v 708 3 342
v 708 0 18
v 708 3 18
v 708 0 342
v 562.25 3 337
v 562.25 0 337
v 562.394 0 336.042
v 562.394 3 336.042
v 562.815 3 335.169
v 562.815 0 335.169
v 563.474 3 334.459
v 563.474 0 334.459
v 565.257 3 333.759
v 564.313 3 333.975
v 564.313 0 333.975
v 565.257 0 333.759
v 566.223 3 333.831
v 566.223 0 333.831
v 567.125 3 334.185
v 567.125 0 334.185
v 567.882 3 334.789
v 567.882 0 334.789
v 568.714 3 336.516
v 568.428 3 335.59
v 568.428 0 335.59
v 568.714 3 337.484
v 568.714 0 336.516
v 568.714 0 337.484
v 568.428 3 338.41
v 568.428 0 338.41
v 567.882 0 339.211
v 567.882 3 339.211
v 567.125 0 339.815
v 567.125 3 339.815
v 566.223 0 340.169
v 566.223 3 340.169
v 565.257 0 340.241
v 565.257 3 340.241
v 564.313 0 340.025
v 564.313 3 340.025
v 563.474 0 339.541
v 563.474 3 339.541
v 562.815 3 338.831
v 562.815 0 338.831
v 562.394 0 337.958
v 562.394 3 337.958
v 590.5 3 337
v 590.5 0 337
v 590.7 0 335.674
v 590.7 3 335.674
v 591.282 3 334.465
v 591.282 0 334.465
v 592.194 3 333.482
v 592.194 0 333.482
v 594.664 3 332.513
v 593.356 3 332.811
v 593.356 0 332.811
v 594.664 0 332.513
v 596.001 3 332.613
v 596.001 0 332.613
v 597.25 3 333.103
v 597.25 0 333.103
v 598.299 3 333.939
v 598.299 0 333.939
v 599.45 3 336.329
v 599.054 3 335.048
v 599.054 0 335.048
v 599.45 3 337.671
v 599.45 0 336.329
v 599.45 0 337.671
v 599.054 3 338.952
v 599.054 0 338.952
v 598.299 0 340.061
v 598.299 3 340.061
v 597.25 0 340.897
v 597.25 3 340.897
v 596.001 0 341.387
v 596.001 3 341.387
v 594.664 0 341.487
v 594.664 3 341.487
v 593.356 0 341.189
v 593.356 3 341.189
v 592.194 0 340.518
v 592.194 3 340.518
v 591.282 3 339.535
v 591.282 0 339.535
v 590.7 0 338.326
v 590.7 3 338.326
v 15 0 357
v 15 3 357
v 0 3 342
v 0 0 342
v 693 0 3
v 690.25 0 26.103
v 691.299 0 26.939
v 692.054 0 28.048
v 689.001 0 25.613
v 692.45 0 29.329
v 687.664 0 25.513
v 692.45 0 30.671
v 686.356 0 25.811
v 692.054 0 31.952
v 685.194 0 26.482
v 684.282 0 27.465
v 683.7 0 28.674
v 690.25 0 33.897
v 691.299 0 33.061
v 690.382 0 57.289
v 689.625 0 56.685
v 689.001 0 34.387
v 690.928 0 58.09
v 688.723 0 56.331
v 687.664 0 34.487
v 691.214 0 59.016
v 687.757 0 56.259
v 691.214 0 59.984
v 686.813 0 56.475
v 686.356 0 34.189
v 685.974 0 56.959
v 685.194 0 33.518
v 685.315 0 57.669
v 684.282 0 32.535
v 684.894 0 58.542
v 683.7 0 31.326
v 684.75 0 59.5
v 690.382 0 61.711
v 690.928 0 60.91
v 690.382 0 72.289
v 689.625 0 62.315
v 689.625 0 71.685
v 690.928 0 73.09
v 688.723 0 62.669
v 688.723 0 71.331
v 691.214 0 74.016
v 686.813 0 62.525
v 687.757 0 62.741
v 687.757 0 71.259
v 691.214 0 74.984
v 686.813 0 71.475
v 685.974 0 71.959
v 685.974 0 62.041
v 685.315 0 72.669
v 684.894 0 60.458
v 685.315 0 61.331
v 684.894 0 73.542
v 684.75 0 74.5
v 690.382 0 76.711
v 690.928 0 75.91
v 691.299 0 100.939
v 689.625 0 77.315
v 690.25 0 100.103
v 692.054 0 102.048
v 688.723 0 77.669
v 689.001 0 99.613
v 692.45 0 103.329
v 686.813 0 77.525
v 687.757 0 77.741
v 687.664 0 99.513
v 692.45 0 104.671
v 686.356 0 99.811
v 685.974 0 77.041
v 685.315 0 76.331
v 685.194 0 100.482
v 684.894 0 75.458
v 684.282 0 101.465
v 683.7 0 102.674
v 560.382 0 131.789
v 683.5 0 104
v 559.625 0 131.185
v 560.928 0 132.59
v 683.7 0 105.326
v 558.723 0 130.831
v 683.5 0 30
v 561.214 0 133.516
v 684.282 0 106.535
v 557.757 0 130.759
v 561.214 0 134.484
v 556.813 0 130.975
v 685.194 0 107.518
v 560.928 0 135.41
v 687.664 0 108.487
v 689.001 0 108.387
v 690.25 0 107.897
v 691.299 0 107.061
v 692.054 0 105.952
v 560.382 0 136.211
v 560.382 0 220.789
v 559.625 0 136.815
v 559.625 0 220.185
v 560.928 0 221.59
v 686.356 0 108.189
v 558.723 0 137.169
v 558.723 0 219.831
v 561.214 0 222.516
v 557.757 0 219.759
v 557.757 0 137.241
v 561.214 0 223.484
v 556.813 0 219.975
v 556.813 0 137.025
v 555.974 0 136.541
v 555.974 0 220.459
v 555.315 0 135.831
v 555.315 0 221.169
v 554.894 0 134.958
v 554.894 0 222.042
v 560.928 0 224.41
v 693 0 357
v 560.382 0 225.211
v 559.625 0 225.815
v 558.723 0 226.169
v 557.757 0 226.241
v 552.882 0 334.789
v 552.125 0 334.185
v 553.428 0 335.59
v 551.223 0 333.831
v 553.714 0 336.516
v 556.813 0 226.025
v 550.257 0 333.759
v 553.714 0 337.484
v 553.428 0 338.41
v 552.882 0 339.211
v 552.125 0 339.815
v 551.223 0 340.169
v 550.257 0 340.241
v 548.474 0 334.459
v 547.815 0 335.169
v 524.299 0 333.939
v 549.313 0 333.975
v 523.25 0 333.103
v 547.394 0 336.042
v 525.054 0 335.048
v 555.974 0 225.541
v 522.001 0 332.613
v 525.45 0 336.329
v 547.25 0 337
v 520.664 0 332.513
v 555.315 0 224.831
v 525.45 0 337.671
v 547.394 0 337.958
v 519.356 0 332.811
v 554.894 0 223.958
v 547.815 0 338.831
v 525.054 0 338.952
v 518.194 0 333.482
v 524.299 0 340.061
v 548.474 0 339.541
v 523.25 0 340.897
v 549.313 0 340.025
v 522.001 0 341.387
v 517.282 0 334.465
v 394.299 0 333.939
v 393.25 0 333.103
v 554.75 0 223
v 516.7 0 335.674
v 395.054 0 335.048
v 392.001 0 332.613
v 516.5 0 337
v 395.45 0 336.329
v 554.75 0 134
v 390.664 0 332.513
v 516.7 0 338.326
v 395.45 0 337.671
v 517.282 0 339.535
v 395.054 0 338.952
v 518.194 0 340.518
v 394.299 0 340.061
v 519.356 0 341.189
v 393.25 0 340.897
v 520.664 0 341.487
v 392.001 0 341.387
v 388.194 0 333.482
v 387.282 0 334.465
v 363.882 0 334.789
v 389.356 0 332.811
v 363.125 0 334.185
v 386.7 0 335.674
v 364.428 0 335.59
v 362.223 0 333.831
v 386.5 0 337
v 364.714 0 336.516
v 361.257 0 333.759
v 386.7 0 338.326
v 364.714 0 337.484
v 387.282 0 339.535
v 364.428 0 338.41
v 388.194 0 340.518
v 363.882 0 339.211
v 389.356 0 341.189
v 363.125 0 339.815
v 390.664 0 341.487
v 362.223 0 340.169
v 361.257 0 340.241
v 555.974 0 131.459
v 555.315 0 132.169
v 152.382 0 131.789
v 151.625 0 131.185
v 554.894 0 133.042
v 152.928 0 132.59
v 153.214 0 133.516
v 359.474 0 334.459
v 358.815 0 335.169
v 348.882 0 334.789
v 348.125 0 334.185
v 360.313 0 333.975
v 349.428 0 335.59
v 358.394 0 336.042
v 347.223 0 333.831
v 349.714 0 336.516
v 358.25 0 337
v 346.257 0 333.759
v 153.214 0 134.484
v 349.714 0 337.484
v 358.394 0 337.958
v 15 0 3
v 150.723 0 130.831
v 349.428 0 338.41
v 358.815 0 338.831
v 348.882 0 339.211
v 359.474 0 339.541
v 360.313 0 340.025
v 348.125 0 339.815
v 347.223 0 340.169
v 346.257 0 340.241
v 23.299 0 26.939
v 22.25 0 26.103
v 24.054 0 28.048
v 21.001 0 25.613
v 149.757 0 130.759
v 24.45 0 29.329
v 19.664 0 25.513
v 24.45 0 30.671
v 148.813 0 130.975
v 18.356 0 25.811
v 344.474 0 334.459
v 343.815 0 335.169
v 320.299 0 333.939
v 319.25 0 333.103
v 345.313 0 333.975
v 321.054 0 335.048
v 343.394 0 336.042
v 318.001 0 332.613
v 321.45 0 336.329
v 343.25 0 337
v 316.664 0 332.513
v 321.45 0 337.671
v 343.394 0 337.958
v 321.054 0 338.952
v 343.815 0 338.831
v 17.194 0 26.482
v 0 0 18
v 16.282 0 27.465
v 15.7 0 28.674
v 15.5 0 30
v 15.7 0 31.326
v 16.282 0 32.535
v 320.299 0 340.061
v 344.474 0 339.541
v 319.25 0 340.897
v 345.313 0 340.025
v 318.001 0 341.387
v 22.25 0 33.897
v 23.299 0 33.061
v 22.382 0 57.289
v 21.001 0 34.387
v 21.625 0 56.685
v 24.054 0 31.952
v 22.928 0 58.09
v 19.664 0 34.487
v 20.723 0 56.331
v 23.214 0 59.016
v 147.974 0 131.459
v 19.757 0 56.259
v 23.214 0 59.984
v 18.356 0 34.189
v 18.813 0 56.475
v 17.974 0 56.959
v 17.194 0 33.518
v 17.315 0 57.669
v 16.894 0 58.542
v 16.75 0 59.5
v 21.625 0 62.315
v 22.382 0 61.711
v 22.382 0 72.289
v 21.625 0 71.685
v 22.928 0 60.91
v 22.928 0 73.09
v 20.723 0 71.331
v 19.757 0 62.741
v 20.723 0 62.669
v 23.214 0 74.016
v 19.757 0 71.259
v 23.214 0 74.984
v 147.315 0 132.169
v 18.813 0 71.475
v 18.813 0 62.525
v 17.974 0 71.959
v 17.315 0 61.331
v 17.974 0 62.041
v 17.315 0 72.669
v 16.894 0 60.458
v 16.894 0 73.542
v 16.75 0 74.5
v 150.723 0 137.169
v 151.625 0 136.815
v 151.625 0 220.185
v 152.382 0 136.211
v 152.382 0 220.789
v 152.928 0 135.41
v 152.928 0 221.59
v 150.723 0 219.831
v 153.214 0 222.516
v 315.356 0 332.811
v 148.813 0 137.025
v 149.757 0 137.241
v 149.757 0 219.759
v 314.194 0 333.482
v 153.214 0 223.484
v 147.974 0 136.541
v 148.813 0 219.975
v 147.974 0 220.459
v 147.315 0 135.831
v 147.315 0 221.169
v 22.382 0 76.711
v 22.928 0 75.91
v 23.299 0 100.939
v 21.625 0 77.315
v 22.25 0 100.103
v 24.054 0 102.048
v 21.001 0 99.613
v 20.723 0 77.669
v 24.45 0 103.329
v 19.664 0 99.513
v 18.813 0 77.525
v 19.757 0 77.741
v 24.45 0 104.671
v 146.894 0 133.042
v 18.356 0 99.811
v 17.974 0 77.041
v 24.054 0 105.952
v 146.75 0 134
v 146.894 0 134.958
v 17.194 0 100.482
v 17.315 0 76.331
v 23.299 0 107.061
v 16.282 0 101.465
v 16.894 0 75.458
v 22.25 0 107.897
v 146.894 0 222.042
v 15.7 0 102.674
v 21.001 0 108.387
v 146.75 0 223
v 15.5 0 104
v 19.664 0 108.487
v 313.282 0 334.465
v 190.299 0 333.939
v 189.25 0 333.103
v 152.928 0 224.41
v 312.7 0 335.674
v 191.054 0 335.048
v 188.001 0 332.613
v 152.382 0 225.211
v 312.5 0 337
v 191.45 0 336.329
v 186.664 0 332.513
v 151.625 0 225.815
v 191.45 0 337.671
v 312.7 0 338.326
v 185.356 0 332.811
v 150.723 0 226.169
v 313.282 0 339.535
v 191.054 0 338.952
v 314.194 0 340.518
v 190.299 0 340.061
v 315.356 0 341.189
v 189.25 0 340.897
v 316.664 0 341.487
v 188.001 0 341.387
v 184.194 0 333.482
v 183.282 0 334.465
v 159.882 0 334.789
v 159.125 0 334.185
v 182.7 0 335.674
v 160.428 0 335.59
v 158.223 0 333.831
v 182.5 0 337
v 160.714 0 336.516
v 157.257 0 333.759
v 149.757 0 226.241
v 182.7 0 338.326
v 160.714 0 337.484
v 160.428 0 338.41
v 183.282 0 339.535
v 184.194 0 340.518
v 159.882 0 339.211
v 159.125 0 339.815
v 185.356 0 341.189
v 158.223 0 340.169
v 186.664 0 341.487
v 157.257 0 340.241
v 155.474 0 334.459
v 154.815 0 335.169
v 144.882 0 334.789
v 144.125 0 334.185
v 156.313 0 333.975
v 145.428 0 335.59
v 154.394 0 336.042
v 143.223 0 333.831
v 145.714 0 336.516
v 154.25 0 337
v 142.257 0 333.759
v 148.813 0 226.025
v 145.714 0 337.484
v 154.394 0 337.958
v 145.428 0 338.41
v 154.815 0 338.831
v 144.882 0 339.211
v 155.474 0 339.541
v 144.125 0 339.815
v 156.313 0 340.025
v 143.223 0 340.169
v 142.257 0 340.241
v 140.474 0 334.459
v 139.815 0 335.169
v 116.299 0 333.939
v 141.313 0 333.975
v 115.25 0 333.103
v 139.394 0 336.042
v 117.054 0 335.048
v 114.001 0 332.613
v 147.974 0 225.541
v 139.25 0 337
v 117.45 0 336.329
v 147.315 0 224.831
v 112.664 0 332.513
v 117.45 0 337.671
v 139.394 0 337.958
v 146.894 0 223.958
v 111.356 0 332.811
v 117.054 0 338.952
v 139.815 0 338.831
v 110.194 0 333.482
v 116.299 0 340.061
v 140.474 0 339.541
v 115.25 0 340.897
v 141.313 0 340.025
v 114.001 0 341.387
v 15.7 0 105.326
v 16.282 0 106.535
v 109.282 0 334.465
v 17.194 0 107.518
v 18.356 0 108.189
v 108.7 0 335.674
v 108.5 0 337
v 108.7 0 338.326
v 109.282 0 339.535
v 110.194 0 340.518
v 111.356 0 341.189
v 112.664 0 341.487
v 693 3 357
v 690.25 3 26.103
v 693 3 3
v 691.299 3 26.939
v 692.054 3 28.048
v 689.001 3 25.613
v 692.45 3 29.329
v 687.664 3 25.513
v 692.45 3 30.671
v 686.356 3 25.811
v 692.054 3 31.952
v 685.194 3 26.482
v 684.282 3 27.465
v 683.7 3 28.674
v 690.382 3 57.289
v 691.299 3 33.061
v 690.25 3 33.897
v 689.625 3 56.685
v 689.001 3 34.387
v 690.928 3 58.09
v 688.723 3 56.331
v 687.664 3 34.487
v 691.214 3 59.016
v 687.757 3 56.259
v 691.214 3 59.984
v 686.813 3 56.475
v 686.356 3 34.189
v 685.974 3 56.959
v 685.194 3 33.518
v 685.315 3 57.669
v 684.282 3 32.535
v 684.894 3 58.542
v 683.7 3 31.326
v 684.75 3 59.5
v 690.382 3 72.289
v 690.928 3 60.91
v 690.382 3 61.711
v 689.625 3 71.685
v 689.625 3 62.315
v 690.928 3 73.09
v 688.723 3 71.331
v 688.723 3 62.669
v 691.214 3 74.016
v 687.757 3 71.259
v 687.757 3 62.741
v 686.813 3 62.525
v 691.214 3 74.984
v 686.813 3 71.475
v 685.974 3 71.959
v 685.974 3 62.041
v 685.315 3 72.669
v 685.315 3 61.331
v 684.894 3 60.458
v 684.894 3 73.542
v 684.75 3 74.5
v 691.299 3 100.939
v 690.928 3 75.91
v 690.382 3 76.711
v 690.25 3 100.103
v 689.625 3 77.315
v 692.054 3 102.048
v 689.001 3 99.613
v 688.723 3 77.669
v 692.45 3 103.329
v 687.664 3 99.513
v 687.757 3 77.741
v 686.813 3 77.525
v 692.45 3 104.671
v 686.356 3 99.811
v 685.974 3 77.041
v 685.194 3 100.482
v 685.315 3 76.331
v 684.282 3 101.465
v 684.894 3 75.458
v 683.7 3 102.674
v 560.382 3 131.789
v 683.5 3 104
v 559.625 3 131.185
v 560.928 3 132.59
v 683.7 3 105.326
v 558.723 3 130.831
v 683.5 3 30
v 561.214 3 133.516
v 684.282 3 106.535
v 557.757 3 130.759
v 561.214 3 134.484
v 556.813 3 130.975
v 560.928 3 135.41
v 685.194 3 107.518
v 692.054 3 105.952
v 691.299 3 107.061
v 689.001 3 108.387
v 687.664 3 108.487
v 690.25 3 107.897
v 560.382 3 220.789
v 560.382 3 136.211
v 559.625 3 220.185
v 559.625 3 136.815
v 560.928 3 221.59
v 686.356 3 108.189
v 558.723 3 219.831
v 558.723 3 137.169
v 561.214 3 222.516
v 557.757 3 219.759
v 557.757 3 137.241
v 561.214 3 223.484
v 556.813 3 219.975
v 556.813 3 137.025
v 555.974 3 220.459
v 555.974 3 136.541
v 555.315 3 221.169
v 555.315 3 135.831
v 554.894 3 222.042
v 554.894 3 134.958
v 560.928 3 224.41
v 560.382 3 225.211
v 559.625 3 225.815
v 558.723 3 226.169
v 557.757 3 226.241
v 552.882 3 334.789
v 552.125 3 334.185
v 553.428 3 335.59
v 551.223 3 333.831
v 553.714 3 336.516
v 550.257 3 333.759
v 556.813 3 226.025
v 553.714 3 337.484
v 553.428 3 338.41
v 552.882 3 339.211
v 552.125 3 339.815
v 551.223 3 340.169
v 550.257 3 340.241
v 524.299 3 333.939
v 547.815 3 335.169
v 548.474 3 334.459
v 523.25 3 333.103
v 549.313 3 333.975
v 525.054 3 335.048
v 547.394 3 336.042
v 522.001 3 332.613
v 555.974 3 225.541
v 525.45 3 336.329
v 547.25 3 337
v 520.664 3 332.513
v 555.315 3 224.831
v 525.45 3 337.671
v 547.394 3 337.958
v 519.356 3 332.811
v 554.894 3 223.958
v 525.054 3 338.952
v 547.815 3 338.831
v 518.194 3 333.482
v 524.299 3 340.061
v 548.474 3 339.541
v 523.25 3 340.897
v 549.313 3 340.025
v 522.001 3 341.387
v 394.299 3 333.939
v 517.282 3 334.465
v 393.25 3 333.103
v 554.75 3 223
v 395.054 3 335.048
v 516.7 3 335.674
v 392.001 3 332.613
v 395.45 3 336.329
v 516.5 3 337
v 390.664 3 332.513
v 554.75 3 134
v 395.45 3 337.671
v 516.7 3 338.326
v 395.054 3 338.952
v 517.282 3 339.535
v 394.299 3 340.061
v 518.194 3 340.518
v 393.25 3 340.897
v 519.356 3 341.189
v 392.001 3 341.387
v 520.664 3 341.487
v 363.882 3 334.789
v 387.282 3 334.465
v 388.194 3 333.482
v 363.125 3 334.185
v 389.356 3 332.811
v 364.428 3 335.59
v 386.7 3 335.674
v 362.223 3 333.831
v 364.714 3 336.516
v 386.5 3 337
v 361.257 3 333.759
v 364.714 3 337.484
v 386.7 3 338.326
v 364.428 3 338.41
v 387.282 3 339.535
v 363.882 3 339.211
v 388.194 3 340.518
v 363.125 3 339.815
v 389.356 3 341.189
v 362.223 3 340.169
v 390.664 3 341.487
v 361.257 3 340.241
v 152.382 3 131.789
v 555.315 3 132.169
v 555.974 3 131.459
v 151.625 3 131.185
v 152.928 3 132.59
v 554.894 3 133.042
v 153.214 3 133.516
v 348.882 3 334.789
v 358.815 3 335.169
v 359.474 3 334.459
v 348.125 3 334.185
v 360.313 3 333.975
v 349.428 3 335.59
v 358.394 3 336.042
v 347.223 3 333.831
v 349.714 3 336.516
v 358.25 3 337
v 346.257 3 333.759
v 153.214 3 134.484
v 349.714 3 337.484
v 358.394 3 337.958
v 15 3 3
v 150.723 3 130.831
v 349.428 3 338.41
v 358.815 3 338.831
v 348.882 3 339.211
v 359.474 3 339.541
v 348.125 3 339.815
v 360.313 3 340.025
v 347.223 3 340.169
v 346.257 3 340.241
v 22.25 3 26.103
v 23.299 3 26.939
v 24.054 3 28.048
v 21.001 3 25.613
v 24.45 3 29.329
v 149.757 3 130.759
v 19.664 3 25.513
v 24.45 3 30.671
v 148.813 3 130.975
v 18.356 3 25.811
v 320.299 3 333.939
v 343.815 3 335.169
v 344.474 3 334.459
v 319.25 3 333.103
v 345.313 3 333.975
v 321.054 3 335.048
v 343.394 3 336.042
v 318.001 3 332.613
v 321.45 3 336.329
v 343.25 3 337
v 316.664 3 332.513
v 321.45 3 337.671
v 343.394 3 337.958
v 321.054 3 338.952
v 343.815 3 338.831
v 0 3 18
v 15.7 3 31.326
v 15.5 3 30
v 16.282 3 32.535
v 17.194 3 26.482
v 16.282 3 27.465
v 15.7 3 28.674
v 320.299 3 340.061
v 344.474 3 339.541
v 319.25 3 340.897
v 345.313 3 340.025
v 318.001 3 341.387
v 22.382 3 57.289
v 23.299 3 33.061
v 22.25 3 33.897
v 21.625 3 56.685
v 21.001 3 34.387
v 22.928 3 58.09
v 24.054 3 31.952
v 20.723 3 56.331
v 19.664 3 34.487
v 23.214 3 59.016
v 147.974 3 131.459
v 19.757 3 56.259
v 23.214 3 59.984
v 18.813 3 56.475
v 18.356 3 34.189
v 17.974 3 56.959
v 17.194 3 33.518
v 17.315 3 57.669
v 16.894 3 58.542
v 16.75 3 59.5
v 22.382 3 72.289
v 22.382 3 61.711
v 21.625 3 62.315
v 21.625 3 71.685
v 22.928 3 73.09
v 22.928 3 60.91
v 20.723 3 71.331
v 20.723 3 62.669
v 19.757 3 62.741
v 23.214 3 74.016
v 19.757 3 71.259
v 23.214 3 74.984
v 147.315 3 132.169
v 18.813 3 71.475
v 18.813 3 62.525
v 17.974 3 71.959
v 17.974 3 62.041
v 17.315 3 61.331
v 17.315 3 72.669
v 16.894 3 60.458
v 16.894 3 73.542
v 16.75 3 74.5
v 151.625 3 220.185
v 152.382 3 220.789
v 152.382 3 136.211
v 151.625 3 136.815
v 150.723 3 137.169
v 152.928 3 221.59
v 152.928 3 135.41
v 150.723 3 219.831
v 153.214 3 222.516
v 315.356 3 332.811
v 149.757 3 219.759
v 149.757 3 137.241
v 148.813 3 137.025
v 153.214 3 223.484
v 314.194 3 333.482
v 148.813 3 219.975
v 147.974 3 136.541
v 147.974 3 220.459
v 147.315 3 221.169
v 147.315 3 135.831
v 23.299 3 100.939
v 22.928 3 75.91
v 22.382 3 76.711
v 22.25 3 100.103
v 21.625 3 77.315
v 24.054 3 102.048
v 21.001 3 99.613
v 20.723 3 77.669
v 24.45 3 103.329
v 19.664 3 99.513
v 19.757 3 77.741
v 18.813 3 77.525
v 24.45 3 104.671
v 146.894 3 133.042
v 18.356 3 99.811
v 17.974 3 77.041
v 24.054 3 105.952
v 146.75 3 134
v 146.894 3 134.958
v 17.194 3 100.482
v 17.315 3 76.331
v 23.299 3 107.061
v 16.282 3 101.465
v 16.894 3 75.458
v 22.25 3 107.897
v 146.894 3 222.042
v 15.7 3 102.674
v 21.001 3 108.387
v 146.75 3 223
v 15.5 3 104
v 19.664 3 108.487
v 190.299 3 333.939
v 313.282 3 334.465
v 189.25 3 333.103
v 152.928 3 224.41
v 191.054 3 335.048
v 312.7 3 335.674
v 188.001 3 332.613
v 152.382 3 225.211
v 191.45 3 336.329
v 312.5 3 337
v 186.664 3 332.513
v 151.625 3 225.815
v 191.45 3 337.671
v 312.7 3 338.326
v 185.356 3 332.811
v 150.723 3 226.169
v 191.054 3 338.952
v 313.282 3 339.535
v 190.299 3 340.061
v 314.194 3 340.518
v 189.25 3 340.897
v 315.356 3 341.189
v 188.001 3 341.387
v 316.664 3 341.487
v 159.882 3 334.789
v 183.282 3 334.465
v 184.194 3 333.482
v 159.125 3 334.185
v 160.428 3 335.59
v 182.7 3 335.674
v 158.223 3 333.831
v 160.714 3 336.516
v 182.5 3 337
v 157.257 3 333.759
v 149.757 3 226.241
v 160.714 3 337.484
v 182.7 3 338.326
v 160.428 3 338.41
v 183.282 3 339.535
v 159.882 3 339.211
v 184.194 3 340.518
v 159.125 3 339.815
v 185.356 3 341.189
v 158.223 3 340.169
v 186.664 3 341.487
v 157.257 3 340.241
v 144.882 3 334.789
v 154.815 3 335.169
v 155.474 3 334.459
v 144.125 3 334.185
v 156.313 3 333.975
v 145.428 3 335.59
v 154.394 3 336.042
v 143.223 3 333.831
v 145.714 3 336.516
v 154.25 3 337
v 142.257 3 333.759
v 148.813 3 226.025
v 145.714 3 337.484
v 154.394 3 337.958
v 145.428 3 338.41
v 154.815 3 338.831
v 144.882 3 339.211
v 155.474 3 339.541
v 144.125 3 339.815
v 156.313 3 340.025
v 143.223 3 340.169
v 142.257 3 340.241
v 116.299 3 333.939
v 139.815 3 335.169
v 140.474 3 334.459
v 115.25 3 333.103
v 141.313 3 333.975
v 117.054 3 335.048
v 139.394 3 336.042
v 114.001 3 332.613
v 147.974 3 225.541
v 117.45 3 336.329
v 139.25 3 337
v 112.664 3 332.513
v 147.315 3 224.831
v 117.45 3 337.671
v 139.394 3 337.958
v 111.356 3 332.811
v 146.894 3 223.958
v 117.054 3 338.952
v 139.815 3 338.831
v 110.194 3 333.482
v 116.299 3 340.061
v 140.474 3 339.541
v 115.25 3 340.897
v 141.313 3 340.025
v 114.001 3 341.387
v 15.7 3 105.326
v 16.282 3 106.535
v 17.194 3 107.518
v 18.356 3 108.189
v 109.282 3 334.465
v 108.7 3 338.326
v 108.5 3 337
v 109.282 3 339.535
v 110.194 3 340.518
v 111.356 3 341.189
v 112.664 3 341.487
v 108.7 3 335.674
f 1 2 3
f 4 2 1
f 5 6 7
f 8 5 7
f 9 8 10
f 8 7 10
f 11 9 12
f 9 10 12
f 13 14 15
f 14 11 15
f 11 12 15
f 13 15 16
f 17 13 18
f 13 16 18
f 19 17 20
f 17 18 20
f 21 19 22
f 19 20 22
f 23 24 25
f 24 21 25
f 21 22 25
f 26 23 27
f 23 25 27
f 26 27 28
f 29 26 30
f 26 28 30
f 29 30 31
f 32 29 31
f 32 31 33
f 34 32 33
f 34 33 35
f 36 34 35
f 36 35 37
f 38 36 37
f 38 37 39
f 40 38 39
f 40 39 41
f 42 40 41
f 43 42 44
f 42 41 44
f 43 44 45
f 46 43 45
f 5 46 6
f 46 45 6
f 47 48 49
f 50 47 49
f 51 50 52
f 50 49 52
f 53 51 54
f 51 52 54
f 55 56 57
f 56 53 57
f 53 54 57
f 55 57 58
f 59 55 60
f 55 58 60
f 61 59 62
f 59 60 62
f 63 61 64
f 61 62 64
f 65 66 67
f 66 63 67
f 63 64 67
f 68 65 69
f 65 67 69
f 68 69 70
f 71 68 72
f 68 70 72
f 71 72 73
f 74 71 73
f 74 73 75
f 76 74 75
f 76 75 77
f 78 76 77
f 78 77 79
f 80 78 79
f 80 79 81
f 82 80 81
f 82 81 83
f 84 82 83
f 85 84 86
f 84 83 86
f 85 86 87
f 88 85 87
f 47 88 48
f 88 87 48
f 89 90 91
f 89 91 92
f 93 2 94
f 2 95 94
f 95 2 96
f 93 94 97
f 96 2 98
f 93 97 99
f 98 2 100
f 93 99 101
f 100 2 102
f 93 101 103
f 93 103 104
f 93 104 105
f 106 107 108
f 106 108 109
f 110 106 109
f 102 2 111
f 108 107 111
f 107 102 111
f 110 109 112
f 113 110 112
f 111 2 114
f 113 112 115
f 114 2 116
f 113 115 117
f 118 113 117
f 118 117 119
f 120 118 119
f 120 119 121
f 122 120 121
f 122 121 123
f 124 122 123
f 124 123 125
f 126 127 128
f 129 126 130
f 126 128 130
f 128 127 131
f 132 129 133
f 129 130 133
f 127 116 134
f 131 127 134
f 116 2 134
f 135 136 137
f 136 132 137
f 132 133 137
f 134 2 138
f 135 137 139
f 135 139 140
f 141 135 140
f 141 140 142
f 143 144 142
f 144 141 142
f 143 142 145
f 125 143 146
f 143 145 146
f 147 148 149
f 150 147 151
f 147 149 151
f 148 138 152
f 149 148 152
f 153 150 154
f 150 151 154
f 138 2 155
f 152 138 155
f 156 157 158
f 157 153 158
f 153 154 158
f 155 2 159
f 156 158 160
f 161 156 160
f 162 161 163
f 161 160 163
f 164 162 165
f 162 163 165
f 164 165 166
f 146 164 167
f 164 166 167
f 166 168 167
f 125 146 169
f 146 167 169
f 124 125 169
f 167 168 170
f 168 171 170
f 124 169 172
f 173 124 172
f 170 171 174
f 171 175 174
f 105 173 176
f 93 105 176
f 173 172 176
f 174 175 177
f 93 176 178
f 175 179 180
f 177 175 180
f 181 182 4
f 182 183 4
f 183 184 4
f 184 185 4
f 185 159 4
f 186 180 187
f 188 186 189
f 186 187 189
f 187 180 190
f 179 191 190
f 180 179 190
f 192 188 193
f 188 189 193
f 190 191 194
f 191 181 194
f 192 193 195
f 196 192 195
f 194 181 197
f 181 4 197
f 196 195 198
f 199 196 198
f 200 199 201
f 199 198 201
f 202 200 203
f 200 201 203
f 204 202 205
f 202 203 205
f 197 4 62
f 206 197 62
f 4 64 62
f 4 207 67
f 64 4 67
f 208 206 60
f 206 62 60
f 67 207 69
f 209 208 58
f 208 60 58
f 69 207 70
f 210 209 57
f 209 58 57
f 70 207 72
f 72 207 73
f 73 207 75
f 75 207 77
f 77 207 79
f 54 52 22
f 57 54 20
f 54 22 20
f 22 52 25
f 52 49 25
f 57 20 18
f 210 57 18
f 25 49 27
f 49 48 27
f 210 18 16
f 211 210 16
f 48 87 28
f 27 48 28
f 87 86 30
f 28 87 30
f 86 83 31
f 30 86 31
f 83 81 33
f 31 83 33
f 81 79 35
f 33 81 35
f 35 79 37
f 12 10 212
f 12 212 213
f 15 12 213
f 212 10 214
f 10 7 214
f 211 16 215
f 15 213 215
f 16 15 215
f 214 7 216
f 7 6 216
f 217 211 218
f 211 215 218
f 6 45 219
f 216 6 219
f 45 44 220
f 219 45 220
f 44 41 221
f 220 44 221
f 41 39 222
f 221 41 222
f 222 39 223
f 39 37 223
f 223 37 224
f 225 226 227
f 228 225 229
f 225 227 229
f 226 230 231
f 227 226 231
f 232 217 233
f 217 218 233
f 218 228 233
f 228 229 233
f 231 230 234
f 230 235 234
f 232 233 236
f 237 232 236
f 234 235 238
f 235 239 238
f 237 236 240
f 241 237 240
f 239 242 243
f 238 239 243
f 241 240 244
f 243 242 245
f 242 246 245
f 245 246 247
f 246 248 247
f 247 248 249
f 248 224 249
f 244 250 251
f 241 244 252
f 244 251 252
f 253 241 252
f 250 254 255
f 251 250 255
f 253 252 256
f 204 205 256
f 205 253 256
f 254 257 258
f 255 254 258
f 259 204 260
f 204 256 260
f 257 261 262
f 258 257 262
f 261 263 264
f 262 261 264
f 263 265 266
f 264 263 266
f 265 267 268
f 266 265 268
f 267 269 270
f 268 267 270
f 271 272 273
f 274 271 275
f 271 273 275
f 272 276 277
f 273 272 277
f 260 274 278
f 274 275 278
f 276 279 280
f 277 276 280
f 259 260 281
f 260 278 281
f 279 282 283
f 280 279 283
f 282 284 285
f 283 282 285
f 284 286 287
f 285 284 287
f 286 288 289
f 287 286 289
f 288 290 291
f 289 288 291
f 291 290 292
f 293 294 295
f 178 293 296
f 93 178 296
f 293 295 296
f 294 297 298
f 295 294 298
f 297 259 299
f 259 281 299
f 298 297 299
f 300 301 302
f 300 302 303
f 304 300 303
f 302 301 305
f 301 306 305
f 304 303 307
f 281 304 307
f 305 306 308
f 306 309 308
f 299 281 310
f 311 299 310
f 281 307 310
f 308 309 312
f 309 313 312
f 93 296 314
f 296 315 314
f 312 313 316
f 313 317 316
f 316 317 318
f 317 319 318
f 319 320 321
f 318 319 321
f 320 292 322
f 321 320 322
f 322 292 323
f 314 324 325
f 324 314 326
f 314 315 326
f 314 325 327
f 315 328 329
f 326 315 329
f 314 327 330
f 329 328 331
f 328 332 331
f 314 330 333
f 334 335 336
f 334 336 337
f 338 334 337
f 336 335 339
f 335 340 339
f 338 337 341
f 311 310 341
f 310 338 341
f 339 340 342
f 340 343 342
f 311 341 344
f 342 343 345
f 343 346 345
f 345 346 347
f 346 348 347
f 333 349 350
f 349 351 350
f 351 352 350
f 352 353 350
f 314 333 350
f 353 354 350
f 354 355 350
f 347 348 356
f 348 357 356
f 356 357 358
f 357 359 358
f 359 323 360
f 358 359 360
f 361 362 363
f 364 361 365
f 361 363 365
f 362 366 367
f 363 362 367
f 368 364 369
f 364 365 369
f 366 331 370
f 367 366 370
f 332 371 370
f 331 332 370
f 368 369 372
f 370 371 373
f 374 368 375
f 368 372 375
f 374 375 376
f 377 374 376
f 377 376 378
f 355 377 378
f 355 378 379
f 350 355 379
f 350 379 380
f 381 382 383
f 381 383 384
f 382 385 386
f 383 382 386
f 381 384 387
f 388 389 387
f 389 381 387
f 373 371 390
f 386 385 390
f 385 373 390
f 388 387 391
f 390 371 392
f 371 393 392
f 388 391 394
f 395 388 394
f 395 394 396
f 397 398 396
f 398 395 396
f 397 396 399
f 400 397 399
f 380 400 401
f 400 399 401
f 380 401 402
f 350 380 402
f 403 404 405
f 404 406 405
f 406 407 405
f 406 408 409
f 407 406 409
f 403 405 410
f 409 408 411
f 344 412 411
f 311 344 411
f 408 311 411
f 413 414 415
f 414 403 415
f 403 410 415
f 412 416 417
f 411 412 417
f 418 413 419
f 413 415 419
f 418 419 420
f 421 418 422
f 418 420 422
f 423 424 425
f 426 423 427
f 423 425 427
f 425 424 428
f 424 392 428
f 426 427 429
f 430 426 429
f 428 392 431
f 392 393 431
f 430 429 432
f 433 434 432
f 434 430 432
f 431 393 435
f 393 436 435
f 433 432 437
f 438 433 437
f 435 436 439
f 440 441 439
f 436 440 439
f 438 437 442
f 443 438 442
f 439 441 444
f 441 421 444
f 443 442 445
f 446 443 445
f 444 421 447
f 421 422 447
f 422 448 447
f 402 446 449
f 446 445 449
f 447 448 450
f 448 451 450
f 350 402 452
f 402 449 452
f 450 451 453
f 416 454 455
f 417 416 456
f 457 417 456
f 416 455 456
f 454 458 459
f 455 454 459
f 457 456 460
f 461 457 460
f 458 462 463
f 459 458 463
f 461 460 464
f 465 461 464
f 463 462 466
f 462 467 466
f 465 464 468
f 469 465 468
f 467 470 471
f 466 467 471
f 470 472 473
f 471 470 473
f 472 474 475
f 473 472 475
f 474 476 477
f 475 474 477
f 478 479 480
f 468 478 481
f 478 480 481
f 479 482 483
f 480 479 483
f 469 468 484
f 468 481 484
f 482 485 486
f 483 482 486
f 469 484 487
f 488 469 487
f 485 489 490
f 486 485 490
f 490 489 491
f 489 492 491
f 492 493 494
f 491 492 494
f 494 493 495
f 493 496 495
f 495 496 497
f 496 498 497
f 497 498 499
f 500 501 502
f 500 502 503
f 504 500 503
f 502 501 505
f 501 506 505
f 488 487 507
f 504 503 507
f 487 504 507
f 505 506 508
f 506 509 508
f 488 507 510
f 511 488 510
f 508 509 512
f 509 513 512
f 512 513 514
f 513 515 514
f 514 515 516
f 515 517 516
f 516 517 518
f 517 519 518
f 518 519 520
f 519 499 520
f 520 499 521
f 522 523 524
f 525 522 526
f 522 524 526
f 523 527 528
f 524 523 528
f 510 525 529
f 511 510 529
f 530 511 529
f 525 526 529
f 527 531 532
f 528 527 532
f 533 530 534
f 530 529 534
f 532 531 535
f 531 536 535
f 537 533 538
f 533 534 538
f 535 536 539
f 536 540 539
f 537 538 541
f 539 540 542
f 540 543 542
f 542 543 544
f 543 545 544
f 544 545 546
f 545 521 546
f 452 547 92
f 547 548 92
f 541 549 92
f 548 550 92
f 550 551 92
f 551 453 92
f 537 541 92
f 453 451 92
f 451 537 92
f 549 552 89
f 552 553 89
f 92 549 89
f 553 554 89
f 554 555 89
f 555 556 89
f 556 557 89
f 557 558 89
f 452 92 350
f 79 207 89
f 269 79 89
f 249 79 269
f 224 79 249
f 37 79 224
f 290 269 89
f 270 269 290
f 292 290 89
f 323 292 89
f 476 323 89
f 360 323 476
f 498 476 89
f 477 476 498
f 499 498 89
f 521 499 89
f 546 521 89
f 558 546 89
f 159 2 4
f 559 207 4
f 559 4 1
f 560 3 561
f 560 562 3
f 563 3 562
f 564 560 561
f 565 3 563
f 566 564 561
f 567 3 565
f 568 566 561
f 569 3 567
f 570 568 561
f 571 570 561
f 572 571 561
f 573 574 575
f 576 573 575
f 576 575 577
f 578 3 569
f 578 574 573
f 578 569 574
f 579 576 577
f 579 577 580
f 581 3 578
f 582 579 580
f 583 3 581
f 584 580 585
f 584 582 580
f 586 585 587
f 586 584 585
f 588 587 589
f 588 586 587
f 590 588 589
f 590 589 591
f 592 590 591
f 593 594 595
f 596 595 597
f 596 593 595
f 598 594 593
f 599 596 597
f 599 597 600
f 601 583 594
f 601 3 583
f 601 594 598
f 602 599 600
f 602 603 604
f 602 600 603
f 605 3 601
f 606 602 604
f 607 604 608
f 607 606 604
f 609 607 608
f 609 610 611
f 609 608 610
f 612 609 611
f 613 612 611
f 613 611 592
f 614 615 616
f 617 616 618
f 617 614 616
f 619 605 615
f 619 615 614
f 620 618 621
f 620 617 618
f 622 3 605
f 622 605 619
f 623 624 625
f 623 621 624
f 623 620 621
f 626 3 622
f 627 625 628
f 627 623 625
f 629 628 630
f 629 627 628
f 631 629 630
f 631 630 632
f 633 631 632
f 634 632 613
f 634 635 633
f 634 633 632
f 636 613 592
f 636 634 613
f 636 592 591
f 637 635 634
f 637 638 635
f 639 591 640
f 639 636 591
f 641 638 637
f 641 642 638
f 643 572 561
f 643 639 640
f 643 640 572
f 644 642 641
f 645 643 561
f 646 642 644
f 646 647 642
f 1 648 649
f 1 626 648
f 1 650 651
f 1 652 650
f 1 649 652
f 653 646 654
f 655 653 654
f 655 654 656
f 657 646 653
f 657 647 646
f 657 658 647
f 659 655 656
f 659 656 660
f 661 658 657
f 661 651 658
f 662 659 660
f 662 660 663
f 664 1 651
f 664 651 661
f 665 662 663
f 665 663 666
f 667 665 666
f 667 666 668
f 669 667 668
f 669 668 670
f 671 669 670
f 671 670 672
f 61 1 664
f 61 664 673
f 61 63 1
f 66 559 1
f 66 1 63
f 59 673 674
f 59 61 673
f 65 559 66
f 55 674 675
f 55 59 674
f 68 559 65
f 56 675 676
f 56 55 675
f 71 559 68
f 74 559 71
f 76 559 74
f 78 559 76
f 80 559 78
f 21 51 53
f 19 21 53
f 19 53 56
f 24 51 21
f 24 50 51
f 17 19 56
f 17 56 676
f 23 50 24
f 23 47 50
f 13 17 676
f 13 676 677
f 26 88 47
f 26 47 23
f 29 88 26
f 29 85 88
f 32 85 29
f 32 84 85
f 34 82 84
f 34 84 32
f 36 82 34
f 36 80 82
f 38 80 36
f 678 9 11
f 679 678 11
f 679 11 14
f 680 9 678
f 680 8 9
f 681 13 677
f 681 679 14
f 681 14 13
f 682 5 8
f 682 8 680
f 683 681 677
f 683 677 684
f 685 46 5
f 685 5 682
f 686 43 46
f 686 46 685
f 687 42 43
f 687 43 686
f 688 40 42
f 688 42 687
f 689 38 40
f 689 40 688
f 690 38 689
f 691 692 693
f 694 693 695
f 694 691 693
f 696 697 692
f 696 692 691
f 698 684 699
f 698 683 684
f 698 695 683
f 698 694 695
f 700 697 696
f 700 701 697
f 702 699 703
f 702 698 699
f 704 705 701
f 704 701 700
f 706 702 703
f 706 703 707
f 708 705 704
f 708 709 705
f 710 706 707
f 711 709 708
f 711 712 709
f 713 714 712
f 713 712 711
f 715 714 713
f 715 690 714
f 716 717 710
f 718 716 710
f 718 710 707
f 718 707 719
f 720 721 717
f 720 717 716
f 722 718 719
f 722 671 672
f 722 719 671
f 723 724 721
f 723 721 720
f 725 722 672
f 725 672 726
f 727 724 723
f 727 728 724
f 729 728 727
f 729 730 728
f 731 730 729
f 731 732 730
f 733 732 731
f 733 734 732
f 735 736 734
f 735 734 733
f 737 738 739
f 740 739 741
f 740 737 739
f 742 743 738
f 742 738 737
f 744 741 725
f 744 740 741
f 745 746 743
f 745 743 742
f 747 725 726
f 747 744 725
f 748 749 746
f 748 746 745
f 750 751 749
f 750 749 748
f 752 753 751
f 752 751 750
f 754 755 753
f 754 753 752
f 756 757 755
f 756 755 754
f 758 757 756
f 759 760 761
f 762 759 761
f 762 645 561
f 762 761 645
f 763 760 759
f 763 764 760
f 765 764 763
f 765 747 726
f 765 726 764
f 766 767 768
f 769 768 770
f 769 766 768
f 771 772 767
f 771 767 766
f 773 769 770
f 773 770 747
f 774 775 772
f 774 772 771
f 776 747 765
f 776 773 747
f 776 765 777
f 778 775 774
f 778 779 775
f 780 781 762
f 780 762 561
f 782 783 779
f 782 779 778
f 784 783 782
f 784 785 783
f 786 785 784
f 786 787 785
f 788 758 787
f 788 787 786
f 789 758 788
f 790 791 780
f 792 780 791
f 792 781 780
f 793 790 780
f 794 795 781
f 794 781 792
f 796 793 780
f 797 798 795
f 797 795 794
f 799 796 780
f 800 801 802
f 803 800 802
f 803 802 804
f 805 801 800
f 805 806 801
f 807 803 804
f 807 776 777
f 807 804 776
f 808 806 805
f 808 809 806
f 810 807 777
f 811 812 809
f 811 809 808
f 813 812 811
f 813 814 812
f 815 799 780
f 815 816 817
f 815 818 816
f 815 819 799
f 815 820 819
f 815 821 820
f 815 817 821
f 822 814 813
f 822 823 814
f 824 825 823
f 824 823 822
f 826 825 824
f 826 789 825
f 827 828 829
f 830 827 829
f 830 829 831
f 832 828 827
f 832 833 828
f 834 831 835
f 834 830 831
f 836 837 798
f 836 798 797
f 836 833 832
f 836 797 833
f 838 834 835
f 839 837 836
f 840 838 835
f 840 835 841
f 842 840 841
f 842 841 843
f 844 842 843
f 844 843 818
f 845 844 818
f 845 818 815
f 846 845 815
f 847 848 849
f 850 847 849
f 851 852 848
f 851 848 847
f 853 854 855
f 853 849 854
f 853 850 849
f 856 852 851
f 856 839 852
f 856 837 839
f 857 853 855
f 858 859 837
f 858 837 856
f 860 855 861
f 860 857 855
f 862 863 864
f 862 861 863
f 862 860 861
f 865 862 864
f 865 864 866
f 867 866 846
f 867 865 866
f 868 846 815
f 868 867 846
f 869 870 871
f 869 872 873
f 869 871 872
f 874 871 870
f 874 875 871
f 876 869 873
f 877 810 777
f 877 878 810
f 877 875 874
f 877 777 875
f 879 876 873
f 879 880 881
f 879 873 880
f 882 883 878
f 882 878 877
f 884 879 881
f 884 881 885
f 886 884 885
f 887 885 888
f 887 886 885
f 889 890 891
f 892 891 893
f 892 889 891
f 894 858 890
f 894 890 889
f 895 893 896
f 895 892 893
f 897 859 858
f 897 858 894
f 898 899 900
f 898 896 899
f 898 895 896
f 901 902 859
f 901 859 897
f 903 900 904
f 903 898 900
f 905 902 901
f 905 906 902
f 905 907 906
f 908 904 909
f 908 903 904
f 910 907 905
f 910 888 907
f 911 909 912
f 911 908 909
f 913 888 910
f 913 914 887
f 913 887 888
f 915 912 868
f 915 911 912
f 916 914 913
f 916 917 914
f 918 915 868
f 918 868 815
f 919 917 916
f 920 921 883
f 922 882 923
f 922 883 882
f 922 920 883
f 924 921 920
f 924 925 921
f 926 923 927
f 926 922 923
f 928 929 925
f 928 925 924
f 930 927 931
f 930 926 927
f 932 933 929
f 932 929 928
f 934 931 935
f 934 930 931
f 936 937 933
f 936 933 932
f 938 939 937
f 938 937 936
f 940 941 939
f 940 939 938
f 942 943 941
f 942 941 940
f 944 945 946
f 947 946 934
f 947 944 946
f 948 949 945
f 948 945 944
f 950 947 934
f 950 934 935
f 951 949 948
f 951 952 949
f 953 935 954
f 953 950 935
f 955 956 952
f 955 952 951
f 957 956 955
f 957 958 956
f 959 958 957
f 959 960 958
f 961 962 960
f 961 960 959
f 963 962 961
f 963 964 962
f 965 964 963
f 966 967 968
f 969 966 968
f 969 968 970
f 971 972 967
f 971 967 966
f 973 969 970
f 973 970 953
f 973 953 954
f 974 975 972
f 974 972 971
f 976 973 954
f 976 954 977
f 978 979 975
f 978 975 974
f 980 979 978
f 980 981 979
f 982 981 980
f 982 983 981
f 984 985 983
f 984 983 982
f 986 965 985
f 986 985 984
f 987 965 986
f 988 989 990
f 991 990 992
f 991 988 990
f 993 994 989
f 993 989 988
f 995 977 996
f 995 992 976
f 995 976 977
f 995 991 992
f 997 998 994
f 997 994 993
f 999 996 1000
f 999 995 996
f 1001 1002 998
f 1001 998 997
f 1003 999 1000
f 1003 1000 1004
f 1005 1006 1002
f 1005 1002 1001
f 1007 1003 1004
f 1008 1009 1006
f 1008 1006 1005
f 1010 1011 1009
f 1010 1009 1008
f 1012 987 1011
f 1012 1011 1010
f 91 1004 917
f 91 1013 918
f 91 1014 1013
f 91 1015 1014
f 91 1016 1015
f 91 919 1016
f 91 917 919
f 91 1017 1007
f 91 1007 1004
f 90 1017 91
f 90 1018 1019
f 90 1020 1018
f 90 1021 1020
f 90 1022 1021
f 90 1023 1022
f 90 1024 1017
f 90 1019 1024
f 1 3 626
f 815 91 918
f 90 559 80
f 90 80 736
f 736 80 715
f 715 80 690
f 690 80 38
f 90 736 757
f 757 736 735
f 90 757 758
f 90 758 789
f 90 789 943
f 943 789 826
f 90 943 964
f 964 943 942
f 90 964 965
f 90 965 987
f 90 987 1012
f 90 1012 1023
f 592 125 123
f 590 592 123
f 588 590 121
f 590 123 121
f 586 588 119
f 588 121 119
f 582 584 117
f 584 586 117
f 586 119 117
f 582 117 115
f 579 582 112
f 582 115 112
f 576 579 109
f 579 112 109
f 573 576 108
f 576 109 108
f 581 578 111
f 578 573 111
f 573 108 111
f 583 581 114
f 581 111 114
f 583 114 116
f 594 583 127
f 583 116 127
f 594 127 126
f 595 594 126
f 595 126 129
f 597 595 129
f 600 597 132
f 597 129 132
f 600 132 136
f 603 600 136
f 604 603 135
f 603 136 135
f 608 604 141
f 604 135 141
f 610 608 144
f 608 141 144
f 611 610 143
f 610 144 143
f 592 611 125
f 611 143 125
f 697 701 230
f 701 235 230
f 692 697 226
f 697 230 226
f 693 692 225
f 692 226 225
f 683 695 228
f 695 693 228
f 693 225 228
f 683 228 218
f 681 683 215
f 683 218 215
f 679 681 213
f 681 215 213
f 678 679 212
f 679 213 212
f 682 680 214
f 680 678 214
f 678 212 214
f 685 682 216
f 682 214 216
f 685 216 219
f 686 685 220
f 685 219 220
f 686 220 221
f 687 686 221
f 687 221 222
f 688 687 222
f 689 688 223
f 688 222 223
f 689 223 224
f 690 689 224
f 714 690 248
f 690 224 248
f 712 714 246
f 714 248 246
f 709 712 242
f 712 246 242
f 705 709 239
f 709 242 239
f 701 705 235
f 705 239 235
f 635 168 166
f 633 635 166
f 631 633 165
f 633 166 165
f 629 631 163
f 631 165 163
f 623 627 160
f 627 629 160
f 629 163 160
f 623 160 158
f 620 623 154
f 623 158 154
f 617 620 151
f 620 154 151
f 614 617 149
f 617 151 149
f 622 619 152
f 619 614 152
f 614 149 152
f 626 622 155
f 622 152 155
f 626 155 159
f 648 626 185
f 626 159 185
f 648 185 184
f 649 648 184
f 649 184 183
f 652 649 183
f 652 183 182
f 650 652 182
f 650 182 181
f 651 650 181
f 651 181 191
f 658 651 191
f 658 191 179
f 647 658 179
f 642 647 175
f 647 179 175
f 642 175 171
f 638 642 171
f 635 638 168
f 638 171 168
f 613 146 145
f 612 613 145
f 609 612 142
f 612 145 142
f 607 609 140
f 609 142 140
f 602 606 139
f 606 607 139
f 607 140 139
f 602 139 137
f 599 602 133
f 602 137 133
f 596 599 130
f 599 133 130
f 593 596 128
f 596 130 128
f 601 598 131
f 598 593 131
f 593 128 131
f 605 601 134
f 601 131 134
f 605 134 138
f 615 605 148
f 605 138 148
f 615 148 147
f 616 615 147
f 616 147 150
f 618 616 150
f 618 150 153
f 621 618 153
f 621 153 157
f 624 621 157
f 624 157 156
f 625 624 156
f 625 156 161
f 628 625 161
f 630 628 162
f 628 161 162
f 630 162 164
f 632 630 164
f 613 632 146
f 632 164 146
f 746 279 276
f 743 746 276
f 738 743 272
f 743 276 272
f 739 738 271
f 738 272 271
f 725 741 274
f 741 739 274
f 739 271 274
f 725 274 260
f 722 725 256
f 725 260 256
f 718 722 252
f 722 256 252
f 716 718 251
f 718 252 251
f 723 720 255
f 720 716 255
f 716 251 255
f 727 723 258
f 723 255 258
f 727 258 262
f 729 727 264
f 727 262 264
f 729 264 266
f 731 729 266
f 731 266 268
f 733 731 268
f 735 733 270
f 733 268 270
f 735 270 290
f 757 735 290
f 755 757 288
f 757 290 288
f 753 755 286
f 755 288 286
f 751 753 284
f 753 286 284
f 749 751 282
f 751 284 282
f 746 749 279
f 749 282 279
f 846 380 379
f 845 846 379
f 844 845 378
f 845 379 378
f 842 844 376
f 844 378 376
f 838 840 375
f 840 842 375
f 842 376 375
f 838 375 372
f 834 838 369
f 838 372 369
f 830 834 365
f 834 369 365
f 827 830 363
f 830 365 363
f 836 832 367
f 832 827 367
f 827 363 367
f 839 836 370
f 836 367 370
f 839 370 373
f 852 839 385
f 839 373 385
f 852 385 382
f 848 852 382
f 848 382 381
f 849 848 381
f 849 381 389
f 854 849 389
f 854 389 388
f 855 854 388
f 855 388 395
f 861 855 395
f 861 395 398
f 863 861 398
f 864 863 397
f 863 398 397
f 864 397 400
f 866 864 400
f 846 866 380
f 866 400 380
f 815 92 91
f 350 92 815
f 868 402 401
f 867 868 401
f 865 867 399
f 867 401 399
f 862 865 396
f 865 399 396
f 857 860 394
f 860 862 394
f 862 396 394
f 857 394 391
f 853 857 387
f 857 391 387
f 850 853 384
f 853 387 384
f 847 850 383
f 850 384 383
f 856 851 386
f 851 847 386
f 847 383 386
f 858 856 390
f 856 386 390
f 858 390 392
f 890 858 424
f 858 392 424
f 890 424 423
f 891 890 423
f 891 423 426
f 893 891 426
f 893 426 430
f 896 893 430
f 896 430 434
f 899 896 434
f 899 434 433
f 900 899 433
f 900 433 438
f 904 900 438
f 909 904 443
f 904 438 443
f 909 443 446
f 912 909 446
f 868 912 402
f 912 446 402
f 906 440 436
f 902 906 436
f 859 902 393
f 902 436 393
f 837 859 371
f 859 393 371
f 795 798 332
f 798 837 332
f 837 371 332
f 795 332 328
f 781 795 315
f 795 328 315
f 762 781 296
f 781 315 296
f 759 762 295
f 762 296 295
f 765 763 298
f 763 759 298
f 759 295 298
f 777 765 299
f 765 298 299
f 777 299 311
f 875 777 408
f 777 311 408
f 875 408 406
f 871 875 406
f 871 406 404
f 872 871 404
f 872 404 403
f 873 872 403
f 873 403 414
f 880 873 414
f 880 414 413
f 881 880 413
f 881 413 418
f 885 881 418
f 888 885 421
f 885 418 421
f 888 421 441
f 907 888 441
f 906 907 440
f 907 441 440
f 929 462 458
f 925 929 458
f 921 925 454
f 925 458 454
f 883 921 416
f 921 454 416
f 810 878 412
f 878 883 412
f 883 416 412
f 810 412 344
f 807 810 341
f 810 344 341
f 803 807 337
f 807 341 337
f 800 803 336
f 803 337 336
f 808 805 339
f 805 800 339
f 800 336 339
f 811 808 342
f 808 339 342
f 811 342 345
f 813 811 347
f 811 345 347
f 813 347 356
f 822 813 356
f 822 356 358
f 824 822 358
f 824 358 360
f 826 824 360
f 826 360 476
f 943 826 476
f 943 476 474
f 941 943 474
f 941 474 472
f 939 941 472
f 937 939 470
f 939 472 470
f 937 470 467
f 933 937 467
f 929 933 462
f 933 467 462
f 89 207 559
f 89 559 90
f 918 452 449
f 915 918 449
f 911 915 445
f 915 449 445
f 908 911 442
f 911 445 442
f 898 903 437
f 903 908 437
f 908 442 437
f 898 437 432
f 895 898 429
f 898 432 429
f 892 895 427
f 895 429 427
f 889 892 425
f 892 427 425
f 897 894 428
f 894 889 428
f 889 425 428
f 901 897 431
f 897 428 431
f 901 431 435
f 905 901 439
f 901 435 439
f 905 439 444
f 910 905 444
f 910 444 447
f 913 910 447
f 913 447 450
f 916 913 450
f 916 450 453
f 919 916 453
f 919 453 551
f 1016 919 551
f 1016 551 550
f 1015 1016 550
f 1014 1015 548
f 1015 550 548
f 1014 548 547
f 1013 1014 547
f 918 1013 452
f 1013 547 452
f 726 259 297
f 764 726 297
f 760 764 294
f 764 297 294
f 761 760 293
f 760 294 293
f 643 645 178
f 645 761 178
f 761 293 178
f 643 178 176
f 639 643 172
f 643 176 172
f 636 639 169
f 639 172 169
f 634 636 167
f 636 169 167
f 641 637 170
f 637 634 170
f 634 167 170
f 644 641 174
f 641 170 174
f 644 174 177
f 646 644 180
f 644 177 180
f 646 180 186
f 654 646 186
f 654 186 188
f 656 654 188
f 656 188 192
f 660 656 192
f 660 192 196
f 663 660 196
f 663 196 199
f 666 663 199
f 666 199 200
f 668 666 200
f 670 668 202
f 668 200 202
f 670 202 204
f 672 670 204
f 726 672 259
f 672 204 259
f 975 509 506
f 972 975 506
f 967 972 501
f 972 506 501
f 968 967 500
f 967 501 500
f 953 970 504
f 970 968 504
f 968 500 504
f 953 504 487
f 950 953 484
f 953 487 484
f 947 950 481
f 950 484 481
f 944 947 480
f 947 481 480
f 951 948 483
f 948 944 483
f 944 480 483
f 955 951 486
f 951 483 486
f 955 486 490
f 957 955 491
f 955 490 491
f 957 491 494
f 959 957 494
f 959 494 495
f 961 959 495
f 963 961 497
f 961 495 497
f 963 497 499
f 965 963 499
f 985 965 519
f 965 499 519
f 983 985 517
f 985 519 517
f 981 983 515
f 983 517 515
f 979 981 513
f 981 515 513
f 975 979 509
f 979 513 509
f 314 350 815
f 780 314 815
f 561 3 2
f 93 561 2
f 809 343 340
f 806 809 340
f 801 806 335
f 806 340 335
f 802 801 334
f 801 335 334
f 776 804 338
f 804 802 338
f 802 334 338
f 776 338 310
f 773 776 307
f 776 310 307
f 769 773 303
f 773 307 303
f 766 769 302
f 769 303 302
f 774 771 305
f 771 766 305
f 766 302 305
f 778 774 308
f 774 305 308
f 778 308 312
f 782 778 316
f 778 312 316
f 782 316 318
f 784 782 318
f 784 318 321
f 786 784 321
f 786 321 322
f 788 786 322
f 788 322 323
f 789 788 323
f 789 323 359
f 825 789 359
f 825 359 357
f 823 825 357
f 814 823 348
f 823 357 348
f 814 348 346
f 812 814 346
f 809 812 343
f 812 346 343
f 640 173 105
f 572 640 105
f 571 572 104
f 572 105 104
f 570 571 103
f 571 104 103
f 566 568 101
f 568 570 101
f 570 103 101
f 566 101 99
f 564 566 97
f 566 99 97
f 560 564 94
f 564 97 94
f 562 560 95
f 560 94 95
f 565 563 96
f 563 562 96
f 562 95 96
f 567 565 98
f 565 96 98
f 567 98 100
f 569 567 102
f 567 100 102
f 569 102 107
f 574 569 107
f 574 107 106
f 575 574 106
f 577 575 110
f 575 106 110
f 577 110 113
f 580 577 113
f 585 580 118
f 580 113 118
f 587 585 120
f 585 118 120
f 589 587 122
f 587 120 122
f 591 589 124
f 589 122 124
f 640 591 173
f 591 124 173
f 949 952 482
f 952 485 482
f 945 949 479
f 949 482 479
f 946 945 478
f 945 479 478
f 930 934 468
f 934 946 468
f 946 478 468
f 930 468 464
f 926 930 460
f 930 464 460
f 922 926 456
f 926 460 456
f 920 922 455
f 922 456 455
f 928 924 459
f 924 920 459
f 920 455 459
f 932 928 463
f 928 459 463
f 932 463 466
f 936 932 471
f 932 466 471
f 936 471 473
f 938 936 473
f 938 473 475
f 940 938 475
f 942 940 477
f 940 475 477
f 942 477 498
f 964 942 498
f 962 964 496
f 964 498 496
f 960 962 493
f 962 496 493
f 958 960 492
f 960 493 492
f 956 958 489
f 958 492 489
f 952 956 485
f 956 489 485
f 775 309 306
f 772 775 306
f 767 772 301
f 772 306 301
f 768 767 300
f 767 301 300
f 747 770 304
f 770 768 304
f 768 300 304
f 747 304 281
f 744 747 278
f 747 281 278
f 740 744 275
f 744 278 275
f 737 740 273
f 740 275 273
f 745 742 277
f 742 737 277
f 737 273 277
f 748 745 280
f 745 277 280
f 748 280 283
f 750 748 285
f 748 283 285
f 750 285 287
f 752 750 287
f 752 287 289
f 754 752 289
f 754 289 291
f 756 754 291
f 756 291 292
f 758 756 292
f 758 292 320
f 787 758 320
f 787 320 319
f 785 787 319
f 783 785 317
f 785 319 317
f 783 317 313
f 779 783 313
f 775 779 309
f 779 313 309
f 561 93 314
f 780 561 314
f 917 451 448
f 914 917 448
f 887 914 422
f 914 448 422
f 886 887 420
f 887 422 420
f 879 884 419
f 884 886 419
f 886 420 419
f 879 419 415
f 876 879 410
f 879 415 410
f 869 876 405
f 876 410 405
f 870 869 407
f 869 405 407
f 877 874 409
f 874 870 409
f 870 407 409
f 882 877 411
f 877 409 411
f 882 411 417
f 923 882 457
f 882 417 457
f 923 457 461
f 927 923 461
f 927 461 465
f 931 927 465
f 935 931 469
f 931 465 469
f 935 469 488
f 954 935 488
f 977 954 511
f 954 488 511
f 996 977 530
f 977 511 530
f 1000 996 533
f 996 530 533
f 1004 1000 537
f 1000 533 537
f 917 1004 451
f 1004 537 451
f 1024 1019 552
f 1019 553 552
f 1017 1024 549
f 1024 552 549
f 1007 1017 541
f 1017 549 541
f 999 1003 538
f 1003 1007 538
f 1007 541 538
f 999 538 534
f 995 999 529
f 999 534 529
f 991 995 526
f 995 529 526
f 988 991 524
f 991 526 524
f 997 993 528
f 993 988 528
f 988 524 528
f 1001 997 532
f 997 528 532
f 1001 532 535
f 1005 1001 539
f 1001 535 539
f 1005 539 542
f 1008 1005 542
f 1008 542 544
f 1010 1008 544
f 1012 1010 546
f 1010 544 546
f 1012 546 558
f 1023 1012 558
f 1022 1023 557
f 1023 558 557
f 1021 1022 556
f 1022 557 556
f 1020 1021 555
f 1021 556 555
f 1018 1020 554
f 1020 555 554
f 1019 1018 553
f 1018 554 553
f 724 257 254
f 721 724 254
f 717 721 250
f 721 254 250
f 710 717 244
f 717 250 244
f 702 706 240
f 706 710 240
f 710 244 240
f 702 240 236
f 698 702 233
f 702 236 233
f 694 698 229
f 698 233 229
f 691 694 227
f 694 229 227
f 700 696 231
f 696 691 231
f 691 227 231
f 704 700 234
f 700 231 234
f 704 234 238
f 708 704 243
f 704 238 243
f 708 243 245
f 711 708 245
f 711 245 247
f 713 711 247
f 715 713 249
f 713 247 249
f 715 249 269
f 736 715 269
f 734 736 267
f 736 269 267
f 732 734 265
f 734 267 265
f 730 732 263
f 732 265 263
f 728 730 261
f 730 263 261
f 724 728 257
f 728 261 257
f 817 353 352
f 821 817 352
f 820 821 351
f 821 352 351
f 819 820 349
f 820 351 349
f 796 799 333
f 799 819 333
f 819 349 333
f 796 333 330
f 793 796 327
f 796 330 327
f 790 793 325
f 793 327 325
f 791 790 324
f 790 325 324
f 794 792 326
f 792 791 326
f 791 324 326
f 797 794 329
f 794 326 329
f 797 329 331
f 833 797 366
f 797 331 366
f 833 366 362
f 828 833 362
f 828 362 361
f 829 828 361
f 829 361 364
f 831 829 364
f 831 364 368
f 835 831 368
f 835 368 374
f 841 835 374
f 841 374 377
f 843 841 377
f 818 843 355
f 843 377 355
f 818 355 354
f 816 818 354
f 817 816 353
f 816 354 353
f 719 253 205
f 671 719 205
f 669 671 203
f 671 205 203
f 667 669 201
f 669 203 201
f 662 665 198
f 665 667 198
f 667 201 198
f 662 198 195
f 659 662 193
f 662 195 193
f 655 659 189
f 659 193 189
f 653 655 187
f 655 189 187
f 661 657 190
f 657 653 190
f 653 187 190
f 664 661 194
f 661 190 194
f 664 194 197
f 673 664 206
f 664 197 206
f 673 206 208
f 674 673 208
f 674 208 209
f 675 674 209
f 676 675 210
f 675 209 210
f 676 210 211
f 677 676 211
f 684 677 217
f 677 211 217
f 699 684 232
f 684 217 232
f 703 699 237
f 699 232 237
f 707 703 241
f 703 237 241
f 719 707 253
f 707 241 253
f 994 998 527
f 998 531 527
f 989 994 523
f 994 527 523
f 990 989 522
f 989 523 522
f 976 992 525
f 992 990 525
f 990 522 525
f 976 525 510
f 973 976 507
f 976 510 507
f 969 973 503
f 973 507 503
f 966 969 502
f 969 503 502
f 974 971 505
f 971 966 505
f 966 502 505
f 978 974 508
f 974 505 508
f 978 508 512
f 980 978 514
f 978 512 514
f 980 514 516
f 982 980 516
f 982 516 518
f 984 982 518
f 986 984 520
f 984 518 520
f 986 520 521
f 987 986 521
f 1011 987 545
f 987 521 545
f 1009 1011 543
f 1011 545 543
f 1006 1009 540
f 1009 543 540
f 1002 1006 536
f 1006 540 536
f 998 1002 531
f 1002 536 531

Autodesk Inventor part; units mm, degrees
ref_plane "YZ Plane" through (0, 0, 0) normal (1, 0, 0) x (0, 1, 0)
ref_plane "XZ Plane" through (0, 0, 0) normal (0, 1, 0) x (-1, 0, 0)
ref_plane "XY Plane" through (0, 0, 0) normal (0, 0, 1) x (1, 0, 0)
sketch "Skizze1" plane through (0, 0, 0) normal (0, 1, 0) x (-1, 0, 0)
  line L0 (0, 0) -> (-708, 0)
  line L1 (-708, 0) -> (-708, 357)
  line L2 (-708, 357) -> (0, 357)
  line L3 (0, 357) -> (0, 0)
  line L4 (-354, 0) -> (-354, 357) construction
  line L5 (0, 178.5) -> (-708, 178.5) construction
  line L6 (-150, 0) -> (-150, 357) construction
  line L7 (-558, 0) -> (-558, 357) construction
  line L8 (-708, 67) -> (0, 67) construction
  line L9 (0, 71.4) -> (-708, 71.4) construction
  line L10 (-688, 337) -> (-688, 20) construction
  line L11 (-688, 20) -> (-20, 20) construction
  line L12 (-20, 20) -> (-20, 337) construction
  line L13 (-20, 337) -> (-688, 337) construction
  line L14 (-28, 19.5) -> (-12, 19.5) construction
  line L15 (-12, 19.5) -> (-12, 114.5) construction
  line L16 (-12, 114.5) -> (-28, 114.5) construction
  line L17 (-28, 114.5) -> (-28, 19.5) construction
  line L18 (-28, 19.5) -> (-12, 114.5) construction
  line L19 (-12, 19.5) -> (-28, 114.5) construction
  line L20 (-102.5, 345) -> (-197.5, 345) construction
  line L21 (-197.5, 345) -> (-197.5, 329) construction
  line L22 (-197.5, 329) -> (-102.5, 329) construction
  line L23 (-102.5, 329) -> (-102.5, 345) construction
  line L24 (-102.5, 345) -> (-197.5, 329) construction
  line L25 (-197.5, 345) -> (-102.5, 329) construction
  line L26 (-306.5, 345) -> (-401.5, 345) construction
  line L27 (-401.5, 345) -> (-401.5, 329) construction
  line L28 (-401.5, 329) -> (-306.5, 329) construction
  line L29 (-306.5, 329) -> (-306.5, 345) construction
  line L30 (-306.5, 345) -> (-401.5, 329) construction
  line L31 (-401.5, 345) -> (-306.5, 329) construction
  circle A0 centre (-20, 59.5) radius 3.25
  circle A1 centre (-20, 30) radius 4.5
  circle A2 centre (-20, 74.5) radius 3.25
  circle A3 centre (-20, 104) radius 4.5
  circle A4 centre (-142.5, 337) radius 3.25
  circle A5 centre (-113, 337) radius 4.5
  circle A6 centre (-317, 337) radius 4.5
  circle A7 centre (-346.5, 337) radius 3.25
  circle A8 centre (-157.5, 337) radius 3.25
  circle A9 centre (-187, 337) radius 4.5
  circle A10 centre (-391, 337) radius 4.5
  circle A11 centre (-361.5, 337) radius 3.25
  circle A12 centre (-688, 59.5) radius 3.25
  circle A13 centre (-688, 30) radius 4.5
  circle A14 centre (-688, 104) radius 4.5
  circle A15 centre (-688, 74.5) radius 3.25
  circle A16 centre (-565.5, 337) radius 3.25
  circle A17 centre (-595, 337) radius 4.5
  circle A18 centre (-550.5, 337) radius 3.25
  circle A19 centre (-521, 337) radius 4.5
  circle A20 centre (-150, 134) radius 3.25
  line L32 (-138.5, 124.5) -> (-161.5, 124.5) construction
  line L33 (-161.5, 124.5) -> (-161.5, 232.5) construction
  line L34 (-161.5, 232.5) -> (-138.5, 232.5) construction
  line L35 (-138.5, 232.5) -> (-138.5, 124.5) construction
  line L36 (-138.5, 124.5) -> (-161.5, 232.5) construction
  line L37 (-161.5, 124.5) -> (-138.5, 232.5) construction
  circle A21 centre (-150, 223) radius 3.25
  circle A22 centre (-558, 134) radius 3.25
  circle A23 centre (-558, 223) radius 3.25
  line L38 (-857.6188, 167) -> (175.5187, 167) construction
  line L39 (-857.6403, 142) -> (175.5402, 142) construction
  line L40 (-708, 317) -> (0, 317) construction
  line L41 (-668, 357) -> (-668, 0) construction
  line L42 (-708, 262) -> (-599.5, 262) construction
  line L43 (-613, 357) -> (-613, 217.4879) construction
  line L44 (-613, 357) -> (-708, 262)
  line L45 (-708, 3) -> (0, 3)
  point P0 (-20, 67)
  point P1 (-150, 337)
  point P2 (-354, 337)
  point P3 (-150, 178.5)
  dimension "d0" = 708
  dimension "d1" = 357
  dimension "d2" = 290
  dimension "d3" = 71.4
  dimension "d4" = 150
  dimension "d5" = 150
  dimension "d6" = 20
  dimension "d7" = 16
  dimension "d8" = 95
  dimension "d9" = 95
  dimension "d10" = 16
  dimension "d11" = 95
  dimension "d12" = 16
  dimension "d13" = 6.5
  dimension "d14" = 7.5
  dimension "d15" = 9
  dimension "d16" = 37
  dimension "d17" = 6.5
  dimension "d18" = 9
  dimension "d19" = 7.5
  dimension "d20" = 37
  dimension "d21" = 6.5
  dimension "d22" = 9
  dimension "d23" = 7.5
  dimension "d24" = 37
  dimension "d30" = 6.5
  dimension "d31" = 44.5
  dimension "d32" = 23
  dimension "d33" = 108
  dimension "d34" = 190
  dimension "d35" = 25
  dimension "d36" = 40
  dimension "d37" = 40
  dimension "d47" = 95
  dimension "d48" = 95
  dimension "d51" = 3
extrude "Ex1 mit Z-Untermaß" add sketch "Skizze1" along normal blind 3 contours L45 L1 L44 L2 L3 | L1 L2 L44
chamfer "Fase1" distance 15 angle 45 4 edges at (0, 1.5, 357) (708, 1.5, 357) (708, 1.5, 3) (0, 1.5, 3)
equation "\"d3\" = 0.2 * d1"
equation "\"d5\" = d4"
equation "\"d17\" = d13"
equation "\"d18\" = d15"
equation "\"d19\" = d14"
equation "\"d20\" = d16"
equation "\"d21\" = d13"
equation "\"d22\" = d15"
equation "\"d23\" = d14"
equation "\"d24\" = d16"
properties part number "enc-FrontPanel Oben 357x708"
